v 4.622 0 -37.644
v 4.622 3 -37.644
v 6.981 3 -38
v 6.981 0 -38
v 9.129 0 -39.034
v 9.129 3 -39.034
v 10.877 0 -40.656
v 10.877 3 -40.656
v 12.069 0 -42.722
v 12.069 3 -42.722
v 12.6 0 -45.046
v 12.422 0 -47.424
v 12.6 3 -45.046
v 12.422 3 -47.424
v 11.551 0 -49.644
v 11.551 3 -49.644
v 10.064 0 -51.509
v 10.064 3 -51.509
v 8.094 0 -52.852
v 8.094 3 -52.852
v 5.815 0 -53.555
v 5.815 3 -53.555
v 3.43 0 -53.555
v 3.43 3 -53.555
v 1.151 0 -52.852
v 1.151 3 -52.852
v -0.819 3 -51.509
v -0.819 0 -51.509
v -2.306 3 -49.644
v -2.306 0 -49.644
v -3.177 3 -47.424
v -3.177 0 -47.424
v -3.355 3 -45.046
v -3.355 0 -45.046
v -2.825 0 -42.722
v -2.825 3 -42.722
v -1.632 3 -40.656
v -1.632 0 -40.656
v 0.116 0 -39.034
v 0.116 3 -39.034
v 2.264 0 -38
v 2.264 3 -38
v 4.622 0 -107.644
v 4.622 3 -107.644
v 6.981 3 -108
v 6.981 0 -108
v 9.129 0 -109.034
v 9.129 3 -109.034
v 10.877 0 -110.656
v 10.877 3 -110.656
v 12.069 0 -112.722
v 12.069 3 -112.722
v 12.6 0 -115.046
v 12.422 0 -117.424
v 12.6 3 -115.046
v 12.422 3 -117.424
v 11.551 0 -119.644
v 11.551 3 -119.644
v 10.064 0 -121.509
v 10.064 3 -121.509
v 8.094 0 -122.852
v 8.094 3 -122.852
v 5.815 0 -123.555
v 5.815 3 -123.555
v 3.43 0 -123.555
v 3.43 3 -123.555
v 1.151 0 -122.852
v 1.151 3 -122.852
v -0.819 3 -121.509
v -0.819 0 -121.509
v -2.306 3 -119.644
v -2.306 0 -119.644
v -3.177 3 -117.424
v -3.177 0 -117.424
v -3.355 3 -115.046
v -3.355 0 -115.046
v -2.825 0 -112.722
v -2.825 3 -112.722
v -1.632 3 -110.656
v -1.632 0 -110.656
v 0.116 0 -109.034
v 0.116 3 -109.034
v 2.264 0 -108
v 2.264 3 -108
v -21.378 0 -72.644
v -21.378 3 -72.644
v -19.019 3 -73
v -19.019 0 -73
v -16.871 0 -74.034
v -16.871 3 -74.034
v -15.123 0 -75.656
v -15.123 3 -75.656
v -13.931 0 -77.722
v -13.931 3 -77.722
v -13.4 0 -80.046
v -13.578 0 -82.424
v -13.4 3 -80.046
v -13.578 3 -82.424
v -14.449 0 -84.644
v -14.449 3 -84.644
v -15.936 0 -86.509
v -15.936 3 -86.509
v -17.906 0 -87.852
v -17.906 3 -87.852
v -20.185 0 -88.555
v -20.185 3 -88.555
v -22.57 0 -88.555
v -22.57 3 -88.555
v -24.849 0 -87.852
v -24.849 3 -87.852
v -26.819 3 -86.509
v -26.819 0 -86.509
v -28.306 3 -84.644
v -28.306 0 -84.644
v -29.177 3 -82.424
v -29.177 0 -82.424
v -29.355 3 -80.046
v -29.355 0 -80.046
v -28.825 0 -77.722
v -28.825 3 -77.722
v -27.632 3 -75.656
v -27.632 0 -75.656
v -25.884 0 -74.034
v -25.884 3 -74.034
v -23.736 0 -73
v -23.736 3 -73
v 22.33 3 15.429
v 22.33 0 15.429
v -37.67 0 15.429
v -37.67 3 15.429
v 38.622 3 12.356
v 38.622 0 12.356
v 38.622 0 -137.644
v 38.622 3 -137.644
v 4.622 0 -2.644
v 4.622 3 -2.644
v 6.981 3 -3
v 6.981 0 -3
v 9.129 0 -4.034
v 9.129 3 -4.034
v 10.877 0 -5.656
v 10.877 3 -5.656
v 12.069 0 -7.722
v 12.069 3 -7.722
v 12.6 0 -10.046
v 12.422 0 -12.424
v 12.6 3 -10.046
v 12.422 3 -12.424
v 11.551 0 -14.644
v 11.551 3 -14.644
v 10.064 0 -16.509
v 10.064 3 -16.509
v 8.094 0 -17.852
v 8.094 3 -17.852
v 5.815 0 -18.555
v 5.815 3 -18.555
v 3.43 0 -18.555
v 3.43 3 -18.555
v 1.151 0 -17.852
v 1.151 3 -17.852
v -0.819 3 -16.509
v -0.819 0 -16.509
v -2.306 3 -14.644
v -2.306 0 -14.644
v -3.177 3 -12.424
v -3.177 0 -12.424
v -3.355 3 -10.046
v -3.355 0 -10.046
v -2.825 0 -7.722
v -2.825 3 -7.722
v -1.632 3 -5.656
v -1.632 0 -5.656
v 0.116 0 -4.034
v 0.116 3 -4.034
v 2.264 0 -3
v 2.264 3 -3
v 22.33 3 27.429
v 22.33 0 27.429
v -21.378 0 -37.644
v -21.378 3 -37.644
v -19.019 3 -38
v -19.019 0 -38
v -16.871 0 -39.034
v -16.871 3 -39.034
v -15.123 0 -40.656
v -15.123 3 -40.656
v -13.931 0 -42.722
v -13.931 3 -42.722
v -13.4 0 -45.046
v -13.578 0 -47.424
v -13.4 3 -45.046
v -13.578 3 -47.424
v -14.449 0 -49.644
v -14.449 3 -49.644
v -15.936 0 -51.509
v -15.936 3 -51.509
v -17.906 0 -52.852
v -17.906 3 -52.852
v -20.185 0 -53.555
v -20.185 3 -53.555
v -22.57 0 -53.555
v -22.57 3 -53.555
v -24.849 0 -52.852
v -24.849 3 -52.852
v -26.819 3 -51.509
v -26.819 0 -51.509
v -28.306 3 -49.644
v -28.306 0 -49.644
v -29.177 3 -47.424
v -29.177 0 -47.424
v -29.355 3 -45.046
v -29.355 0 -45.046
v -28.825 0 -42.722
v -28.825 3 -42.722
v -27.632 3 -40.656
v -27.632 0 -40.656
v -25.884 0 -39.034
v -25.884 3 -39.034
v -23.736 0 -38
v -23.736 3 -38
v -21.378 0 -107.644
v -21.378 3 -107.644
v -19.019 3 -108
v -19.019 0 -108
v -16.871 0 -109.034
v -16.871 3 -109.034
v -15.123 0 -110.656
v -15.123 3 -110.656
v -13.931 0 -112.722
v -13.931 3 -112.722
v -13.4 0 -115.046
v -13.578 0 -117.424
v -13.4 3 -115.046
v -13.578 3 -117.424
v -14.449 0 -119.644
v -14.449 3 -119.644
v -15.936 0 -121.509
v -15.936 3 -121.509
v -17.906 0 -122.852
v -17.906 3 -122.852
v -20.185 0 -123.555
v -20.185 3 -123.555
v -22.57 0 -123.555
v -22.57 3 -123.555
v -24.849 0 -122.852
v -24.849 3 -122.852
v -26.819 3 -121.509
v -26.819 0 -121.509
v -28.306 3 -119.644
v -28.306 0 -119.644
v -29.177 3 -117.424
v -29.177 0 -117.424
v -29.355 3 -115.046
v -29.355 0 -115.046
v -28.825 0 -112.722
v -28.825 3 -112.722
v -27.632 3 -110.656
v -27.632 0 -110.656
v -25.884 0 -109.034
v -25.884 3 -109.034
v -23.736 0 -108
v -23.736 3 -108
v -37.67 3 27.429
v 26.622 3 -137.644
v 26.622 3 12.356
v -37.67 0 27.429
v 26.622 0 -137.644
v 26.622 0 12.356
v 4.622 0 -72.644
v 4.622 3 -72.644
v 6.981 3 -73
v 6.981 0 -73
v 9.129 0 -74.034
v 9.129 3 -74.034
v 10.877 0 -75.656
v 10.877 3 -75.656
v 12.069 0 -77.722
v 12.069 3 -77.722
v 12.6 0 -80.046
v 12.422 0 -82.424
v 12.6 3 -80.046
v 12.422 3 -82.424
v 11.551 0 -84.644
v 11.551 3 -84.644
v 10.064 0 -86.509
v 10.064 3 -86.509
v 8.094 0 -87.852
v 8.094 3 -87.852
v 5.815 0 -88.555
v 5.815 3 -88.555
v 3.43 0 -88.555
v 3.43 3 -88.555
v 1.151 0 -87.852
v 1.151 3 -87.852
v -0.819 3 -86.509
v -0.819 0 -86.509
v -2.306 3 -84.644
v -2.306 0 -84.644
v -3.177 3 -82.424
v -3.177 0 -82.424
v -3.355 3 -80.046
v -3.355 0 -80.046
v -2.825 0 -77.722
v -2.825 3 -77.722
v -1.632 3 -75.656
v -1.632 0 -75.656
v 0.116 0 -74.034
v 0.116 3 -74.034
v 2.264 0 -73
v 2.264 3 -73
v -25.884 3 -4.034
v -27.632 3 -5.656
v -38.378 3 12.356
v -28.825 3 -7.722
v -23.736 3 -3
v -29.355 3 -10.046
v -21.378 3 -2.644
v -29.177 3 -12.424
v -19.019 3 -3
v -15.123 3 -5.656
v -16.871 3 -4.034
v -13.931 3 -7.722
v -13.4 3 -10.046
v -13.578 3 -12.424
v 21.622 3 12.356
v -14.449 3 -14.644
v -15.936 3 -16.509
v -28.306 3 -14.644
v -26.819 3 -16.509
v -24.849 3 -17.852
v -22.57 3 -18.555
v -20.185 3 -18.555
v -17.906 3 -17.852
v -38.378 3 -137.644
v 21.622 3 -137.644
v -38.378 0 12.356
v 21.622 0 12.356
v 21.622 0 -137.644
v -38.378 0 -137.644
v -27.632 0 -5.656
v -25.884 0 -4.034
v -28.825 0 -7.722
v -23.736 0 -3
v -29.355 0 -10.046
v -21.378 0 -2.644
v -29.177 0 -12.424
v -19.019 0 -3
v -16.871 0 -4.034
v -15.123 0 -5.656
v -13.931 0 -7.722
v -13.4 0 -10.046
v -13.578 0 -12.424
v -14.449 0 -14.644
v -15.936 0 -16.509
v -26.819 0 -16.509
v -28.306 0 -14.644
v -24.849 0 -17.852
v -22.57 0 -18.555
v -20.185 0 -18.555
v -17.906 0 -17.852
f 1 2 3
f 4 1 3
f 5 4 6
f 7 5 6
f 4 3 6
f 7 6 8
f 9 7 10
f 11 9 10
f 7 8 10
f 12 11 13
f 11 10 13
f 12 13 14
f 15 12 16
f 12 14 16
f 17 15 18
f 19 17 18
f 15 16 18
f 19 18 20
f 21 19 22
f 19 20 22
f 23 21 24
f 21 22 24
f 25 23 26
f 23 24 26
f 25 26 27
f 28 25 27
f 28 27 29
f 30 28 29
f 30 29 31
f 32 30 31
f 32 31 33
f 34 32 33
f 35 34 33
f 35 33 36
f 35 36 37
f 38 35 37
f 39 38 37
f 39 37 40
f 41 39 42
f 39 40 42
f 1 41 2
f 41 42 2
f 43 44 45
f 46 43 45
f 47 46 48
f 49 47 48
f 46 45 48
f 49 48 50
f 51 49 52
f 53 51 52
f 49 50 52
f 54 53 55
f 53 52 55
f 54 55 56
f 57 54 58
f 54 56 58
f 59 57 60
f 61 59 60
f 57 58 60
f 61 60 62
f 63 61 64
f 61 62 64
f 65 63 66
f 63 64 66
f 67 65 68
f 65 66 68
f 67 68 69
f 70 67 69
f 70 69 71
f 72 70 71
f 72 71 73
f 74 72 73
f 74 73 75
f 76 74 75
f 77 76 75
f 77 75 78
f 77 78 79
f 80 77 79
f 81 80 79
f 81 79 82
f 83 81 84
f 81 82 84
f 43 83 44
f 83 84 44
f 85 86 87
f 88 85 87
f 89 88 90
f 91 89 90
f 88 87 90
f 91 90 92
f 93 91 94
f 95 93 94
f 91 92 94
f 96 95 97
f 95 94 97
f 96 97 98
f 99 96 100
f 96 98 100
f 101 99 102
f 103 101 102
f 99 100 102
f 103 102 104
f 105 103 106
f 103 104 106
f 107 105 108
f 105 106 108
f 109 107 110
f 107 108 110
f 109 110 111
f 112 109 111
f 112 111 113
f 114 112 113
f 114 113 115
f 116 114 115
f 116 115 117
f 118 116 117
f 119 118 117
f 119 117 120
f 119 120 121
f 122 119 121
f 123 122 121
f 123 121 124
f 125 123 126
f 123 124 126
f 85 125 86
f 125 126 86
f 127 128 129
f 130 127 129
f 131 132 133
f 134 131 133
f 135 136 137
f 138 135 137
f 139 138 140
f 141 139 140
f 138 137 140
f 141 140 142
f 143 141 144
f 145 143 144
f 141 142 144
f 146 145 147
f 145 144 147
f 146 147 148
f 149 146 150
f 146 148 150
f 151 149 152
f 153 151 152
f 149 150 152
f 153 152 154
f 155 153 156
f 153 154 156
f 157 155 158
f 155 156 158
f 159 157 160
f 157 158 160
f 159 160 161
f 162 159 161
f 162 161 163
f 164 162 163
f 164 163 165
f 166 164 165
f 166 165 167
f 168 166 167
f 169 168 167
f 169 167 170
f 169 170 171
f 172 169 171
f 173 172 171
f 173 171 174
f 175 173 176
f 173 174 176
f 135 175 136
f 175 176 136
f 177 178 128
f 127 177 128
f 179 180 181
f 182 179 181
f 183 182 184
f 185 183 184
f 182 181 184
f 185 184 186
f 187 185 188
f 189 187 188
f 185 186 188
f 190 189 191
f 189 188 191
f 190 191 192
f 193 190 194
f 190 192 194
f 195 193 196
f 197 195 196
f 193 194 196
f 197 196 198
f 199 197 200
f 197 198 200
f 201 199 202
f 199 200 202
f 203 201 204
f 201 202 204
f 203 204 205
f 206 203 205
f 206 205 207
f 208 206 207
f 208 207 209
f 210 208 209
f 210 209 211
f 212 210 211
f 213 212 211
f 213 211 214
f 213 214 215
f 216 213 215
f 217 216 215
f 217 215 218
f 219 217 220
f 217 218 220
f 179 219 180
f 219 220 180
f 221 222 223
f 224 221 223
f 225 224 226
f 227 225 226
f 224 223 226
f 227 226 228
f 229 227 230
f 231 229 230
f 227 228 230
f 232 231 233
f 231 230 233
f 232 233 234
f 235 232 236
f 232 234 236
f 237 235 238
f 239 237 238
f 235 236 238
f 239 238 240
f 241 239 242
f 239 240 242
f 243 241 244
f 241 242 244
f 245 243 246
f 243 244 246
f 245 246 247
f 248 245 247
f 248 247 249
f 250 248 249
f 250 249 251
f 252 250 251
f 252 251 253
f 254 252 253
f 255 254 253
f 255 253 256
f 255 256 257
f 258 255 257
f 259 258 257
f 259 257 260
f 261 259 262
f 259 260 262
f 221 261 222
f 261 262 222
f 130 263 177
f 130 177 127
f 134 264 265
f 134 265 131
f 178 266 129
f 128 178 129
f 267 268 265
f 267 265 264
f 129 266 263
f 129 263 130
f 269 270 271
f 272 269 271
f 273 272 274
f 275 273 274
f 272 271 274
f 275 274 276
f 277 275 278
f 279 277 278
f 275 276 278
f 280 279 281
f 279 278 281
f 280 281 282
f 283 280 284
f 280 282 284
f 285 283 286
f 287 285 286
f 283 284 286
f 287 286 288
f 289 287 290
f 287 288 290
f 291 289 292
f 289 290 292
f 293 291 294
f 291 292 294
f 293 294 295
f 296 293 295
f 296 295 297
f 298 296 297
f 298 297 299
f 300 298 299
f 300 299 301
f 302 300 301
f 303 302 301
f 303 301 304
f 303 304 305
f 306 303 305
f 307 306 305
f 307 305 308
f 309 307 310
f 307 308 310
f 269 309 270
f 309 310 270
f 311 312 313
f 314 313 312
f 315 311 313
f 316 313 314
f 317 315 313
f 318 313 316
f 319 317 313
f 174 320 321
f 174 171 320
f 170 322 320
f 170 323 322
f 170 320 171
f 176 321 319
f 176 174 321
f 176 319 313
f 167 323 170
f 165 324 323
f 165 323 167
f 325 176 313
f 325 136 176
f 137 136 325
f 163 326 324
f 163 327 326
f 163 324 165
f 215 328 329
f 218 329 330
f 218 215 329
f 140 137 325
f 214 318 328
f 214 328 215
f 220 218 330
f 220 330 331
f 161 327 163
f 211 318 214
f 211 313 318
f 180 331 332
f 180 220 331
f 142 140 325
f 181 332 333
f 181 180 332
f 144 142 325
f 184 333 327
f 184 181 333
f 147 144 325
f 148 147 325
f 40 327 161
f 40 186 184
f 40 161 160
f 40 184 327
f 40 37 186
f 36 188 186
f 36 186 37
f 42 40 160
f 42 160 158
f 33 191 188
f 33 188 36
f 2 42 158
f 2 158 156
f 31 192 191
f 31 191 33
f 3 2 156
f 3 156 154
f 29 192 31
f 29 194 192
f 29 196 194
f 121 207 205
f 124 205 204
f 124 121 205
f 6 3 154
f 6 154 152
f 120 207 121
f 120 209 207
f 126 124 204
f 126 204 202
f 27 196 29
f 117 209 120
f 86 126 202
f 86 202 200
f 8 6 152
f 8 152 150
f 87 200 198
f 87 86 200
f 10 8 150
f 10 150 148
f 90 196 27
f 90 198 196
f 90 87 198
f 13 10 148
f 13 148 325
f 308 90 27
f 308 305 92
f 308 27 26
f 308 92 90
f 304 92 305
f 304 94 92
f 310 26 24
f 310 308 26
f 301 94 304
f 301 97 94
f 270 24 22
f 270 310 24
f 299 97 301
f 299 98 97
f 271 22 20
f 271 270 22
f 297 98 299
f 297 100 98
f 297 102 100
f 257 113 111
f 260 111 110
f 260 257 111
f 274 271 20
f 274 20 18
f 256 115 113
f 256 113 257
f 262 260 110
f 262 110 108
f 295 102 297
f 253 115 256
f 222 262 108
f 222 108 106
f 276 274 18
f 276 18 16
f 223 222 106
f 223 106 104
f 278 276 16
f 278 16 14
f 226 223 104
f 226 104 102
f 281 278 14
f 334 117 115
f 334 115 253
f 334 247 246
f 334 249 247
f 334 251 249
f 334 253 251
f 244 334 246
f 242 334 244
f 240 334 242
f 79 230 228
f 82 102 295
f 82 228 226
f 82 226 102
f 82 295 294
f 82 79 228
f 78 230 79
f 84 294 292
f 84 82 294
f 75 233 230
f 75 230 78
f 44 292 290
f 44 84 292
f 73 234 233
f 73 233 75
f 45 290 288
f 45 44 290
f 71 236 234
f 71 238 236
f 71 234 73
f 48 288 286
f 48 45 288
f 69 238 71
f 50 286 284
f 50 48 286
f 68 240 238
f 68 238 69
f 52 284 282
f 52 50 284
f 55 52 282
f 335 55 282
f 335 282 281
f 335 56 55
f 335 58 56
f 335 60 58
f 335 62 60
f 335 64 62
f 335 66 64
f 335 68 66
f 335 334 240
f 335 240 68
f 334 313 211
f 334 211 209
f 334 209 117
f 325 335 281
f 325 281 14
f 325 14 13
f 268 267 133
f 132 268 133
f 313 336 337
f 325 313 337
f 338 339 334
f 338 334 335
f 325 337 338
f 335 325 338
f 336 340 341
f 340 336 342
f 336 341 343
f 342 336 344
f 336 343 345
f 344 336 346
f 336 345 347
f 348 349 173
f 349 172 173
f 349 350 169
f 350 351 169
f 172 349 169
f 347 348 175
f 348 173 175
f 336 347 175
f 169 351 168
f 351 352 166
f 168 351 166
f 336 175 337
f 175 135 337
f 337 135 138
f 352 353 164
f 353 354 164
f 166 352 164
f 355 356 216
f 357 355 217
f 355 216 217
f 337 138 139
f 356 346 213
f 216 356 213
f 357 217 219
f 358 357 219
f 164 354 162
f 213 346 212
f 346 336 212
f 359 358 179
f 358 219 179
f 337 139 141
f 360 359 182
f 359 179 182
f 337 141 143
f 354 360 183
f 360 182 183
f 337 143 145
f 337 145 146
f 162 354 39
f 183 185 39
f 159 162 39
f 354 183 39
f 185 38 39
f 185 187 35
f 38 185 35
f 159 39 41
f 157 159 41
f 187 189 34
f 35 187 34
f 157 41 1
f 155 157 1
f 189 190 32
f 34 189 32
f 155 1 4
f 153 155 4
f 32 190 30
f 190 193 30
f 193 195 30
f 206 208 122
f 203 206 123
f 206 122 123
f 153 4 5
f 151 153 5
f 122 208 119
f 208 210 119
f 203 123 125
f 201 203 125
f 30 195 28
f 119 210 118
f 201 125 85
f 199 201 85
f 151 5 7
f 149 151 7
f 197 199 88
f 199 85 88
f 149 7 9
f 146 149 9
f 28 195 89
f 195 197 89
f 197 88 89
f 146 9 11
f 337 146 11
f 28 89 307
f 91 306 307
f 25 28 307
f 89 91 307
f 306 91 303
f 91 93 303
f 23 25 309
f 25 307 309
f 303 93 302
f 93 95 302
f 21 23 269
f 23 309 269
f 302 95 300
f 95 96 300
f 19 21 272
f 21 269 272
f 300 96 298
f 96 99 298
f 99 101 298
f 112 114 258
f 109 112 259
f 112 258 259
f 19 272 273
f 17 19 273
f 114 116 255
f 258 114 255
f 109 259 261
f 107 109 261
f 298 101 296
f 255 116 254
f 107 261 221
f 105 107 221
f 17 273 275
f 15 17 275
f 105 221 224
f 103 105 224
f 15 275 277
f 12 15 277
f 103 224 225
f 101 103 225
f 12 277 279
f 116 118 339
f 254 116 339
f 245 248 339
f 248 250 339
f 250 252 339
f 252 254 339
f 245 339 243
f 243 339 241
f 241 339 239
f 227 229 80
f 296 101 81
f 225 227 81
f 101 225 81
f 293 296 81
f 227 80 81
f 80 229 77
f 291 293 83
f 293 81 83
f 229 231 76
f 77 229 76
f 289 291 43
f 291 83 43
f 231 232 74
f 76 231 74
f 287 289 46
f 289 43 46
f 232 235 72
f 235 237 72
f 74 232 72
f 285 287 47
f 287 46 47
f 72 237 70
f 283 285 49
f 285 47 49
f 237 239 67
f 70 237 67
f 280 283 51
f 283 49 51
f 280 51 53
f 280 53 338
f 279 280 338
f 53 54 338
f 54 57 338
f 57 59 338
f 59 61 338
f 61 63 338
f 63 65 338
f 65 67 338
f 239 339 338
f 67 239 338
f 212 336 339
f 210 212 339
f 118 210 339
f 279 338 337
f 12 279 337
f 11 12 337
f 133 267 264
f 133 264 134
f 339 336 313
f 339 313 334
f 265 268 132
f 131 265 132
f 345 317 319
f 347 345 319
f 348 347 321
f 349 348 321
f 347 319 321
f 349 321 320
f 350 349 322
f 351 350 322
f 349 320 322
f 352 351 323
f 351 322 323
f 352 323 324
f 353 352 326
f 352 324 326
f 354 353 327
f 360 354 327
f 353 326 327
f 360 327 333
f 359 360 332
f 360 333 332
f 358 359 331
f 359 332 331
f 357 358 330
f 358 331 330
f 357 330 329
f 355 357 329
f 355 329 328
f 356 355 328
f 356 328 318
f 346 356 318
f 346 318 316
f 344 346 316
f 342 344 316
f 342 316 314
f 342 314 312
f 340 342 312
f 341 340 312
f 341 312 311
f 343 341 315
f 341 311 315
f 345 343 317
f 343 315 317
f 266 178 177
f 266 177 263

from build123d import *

# Parameters (mm, degrees)
SKETCH1_W             = 60
SKETCH1_H             = 150
BOSS_EXTRUDE2_DEPTH   = 3
SKETCH2_W             = 12
SKETCH2_H             = 150
BOSS_EXTRUDE4_DEPTH   = 3
SKETCH3_W             = 12
SKETCH3_H             = 60
BOSS_EXTRUDE5_DEPTH   = 3
SKETCH4_R             = 8
CUT_EXTRUDE1_DEPTH    = 3
BODY_MOVE_COPY1_ANGLE = 90


with BuildPart() as part:
    # Sketch1 → Boss-Extrude2 (new body)
    with BuildSketch(Plane(origin=(0, 0, 0), x_dir=(1, 0, 0), z_dir=(0, 1, 0))):
        with Locations((-8.377535101, 62.644305772)):
            Rectangle(SKETCH1_W, SKETCH1_H)
    extrude(amount=BOSS_EXTRUDE2_DEPTH)

    # Sketch4 → Cut-Extrude1 (cut)
    with BuildSketch(Plane(origin=(0, 3, 0), x_dir=(1, 0, 0), z_dir=(0, 1, 0))):
        with Locations(Location((4.622464899, 10.644305772, 0), (0, 0, 270))):
            Circle(SKETCH4_R)
        with Locations(Location((-21.377535101, 10.644305772, 0), (0, 0, 270))):
            Circle(SKETCH4_R)
        with Locations(Location((4.622464899, 45.644305772, 0), (0, 0, 270))):
            Circle(SKETCH4_R)
        with Locations(Location((-21.377535101, 45.644305772, 0), (0, 0, 270))):
            Circle(SKETCH4_R)
        with Locations(Location((4.622464899, 80.644305772, 0), (0, 0, 270))):
            Circle(SKETCH4_R)
        with Locations(Location((-21.377535101, 80.644305772, 0), (0, 0, 270))):
            Circle(SKETCH4_R)
        with Locations(Location((4.622464899, 115.644305772, 0), (0, 0, 270))):
            Circle(SKETCH4_R)
        with Locations(Location((-21.377535101, 115.644305772, 0), (0, 0, 270))):
            Circle(SKETCH4_R)
    extrude(amount=-CUT_EXTRUDE1_DEPTH, mode=Mode.SUBTRACT)


with BuildPart() as body_2:
    # Sketch2 → Boss-Extrude4 (new body)
    with BuildSketch(Plane(origin=(0, 0, 0), x_dir=(1, 0, 0), z_dir=(0, 1, 0))):
        with Locations((32.622464899, 62.644305772)):
            Rectangle(SKETCH2_W, SKETCH2_H)
    extrude(amount=BOSS_EXTRUDE4_DEPTH)


with BuildPart() as body_3:
    # Sketch3 → Boss-Extrude5 (new body)
    with BuildSketch(Plane(origin=(0, 0, 0), x_dir=(1, 0, 0), z_dir=(0, 1, 0))):
        with Locations((49.622464899, 17.644305772)):
            Rectangle(SKETCH3_W, SKETCH3_H)
    extrude(amount=BOSS_EXTRUDE5_DEPTH)


with BuildPart() as body_3_1:
    # Body-Move/Copy1: moved
    add(body_3.part.rotate(Axis((99.629560174, 0, -43.26681982), (0, 1, 0)), BODY_MOVE_COPY1_ANGLE))


with BuildPart() as body_3_2:
    # Body-Move/Copy2: moved
    add(body_3_1.part.moved(Location((-132.922222744, 0, 14.688570542))))


solid = Compound([part.part, body_2.part, body_3_2.part])
